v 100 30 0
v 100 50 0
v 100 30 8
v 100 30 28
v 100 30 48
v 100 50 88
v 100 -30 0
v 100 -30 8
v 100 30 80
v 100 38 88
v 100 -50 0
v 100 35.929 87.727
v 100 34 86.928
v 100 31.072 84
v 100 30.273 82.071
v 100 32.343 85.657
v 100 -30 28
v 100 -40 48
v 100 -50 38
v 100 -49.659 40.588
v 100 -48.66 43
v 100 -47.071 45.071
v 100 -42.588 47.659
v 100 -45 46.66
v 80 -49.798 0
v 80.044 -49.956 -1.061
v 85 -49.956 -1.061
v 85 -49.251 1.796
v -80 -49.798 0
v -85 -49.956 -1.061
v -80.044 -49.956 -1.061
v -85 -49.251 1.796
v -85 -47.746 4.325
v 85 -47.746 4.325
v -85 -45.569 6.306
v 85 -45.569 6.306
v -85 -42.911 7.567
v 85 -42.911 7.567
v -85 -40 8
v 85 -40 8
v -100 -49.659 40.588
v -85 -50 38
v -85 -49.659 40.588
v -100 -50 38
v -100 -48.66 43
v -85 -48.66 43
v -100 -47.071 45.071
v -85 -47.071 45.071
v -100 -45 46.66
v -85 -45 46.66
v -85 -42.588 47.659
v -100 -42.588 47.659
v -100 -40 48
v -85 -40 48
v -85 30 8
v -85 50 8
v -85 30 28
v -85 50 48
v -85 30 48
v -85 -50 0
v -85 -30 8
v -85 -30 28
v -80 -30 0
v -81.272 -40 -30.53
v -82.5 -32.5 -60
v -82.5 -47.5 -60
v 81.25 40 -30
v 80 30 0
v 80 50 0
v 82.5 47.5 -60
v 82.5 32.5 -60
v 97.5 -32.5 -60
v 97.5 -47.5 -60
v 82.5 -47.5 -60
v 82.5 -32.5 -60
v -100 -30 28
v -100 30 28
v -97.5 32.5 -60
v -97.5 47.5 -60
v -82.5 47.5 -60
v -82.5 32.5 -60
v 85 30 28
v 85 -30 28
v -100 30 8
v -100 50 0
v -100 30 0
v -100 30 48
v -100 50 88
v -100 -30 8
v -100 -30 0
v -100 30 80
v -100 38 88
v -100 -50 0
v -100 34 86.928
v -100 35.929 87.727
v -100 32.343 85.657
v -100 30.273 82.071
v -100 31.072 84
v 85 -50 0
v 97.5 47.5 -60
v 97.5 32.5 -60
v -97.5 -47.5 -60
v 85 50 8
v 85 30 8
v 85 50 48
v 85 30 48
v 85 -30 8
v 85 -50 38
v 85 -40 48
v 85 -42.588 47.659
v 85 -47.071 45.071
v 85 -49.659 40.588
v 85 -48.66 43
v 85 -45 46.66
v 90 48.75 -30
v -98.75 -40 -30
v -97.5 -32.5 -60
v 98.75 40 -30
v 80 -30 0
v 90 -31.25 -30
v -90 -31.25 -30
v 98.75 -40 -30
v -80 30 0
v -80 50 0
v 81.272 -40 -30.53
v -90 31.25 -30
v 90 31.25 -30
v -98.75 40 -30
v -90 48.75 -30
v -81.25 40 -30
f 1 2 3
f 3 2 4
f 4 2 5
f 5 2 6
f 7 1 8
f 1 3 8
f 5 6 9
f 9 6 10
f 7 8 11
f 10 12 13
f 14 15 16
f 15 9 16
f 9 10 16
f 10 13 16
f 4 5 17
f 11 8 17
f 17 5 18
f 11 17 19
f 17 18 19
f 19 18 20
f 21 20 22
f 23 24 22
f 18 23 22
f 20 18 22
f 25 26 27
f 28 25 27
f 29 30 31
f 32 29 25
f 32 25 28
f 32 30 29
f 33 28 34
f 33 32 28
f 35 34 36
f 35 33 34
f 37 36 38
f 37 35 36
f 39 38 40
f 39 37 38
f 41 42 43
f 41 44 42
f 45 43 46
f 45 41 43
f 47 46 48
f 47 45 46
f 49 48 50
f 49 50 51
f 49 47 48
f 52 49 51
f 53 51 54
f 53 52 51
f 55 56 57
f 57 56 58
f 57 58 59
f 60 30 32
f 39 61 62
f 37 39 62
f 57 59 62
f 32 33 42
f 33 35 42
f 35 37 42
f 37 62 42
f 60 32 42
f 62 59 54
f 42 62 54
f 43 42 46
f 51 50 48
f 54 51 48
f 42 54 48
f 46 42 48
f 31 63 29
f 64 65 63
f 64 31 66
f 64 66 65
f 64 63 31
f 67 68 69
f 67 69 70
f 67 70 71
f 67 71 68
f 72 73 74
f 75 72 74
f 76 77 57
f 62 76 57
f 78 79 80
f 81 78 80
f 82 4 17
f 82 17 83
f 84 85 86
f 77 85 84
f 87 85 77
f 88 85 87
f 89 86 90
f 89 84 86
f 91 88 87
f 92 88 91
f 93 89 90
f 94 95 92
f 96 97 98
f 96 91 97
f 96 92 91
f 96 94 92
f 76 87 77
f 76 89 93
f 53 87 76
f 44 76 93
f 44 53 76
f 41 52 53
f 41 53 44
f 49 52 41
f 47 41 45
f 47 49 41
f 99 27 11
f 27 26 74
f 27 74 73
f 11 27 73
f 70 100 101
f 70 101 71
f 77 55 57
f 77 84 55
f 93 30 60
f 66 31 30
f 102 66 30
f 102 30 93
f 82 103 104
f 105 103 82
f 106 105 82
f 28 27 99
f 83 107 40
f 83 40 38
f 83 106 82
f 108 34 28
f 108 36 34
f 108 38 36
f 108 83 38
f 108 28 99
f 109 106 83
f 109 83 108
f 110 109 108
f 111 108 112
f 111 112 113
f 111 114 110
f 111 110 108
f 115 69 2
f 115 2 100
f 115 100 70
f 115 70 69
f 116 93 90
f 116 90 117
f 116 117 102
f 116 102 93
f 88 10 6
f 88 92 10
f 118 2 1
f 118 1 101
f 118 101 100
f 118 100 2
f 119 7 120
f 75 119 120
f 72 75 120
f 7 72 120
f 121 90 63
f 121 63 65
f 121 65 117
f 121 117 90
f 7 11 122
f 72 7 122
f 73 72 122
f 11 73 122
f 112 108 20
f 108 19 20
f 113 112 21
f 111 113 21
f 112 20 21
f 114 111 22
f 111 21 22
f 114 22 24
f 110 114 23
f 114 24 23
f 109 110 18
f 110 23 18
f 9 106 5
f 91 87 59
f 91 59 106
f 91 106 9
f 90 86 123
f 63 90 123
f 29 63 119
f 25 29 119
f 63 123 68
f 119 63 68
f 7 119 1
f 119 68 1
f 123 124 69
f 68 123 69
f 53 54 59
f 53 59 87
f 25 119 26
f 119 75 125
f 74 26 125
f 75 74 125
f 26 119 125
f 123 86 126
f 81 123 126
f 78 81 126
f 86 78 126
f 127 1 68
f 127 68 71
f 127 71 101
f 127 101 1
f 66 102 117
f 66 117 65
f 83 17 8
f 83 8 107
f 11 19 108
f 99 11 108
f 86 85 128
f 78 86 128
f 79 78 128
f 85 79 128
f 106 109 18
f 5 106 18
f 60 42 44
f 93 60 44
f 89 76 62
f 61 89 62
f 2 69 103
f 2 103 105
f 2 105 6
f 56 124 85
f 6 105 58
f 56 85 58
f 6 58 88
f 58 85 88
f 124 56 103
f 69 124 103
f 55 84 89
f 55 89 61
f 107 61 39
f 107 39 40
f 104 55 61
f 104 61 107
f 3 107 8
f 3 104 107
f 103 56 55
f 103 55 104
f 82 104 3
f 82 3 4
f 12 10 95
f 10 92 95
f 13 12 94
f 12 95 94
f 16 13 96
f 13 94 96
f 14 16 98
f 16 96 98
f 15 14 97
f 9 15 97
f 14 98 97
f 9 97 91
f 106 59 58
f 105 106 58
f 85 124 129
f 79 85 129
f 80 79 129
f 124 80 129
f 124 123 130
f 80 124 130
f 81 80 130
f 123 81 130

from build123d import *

# Parameters (mm, degrees)
F0_W         = 200
F0_H         = 100
F1_DEPTH     = 8
F2_W         = 20
F2_H         = 20
F4_W         = 15
F4_H         = 15
F8_W         = 15
F8_H         = 20
F9_DEPTH     = 80
F11_W        = 20
F11_H        = 40
F12_DEPTH    = 170
F14_DEPTH    = 80
F15_W        = 15
F15_H        = 20
F16_DEPTH    = 20
F18_R        = 10
F19_R        = 10
F20_T1_DEPTH = 170
F21_R        = 8


# Not quite as in the source:
# - a fillet or chamfer that OpenCascade refuses, or shapes differently, is made with other operations: its cross-section is extruded or revolved along the edge and cut away or added


with BuildPart() as f1:
    # F0 (on Top) → F1 (new body)
    with BuildSketch(Plane.XY):
        Rectangle(F0_W, F0_H)
    extrude(amount=F1_DEPTH)

    # F2 (on face) → F5 section 0
    with BuildSketch(Plane(origin=(0, 0, 0), x_dir=(1, 0, 0), z_dir=(0, 0, -1))):
        with Locations((-90, 40)):
            Rectangle(F2_W, F2_H)
    # F4 (on offset) → F5 section 1
    with BuildSketch(Plane.XY.offset(-60)):
        with Locations((-90, -40)):
            Rectangle(F4_W, F4_H)
    loft()

    # F6: F1 across plane


with BuildPart() as f1_1:
    add(f1.part)
    add(f1.part.mirror(Plane.XZ))

    # F7: F1 across plane


with BuildPart() as f1_2:
    add(f1_1.part)
    add(f1_1.part.mirror(Plane.YZ))

    # F8 (on face) → F9 (join)
    with BuildSketch(Plane.XY.offset(8)):
        with Locations((-92.5, 40)):
            Rectangle(F8_W, F8_H)
    extrude(amount=F9_DEPTH)

    # F10: F1 across plane


with BuildPart() as f1_3:
    add(f1_2.part)
    add(f1_2.part.mirror(Plane.YZ))

    # F11 (on face) → F12 (join)
    with BuildSketch(Plane.YZ.offset(-85)):
        with Locations((40, 68)):
            Rectangle(F11_W, F11_H)
    extrude(amount=F12_DEPTH)

    # F13 (on face) → F14 (join)
    with BuildSketch(Plane.XZ.offset(-30)):
        Polygon((-85, 28), (-85, 48), (-92.5, 48), (-100, 48), (-100, 28), align=None)
    extrude(amount=F14_DEPTH)

    # F15 (on face) → F16 (join)
    with BuildSketch(Plane(origin=(0, 0, 28), x_dir=(1, 0, 0), z_dir=(0, 0, -1))):
        with Locations((-92.5, 40)):
            Rectangle(F15_W, F15_H)
    extrude(amount=F16_DEPTH)

    # F17: F1 across plane


with BuildPart() as f1_4:
    add(f1_3.part)
    add(f1_3.part.mirror(Plane.YZ))

    # F18
    f18_edges = [f1_4.edges().sort_by_distance(p)[0] for p in [
        (92.5, -50, 48),
    ]]
    fillet(f18_edges, radius=F18_R)

    # F19
    f19_edges = [f1_4.edges().sort_by_distance(p)[0] for p in [
        (-92.5, -50, 48),
    ]]
    fillet(f19_edges, radius=F19_R)

    # F20: fillet of radius 10 on 1 edges, made by hand

    # F20_s2 → F20_t1 (cut)
    with BuildSketch(Plane.YZ.offset(-85)):
        with BuildLine():
            ThreePointArc((-50, -2), (-47.0710678119, 5.0710678119), (-40, 8))
            Line((-40, 8), (-50, 8))
            Line((-50, 8), (-50, -2))
        make_face()
    extrude(amount=F20_T1_DEPTH, mode=Mode.SUBTRACT)

    # F21
    f21_edges = [f1_4.edges().sort_by_distance(p)[0] for p in [
        (0, 30, 88),
    ]]
    fillet(f21_edges, radius=F21_R)


solid = f1_4.part
